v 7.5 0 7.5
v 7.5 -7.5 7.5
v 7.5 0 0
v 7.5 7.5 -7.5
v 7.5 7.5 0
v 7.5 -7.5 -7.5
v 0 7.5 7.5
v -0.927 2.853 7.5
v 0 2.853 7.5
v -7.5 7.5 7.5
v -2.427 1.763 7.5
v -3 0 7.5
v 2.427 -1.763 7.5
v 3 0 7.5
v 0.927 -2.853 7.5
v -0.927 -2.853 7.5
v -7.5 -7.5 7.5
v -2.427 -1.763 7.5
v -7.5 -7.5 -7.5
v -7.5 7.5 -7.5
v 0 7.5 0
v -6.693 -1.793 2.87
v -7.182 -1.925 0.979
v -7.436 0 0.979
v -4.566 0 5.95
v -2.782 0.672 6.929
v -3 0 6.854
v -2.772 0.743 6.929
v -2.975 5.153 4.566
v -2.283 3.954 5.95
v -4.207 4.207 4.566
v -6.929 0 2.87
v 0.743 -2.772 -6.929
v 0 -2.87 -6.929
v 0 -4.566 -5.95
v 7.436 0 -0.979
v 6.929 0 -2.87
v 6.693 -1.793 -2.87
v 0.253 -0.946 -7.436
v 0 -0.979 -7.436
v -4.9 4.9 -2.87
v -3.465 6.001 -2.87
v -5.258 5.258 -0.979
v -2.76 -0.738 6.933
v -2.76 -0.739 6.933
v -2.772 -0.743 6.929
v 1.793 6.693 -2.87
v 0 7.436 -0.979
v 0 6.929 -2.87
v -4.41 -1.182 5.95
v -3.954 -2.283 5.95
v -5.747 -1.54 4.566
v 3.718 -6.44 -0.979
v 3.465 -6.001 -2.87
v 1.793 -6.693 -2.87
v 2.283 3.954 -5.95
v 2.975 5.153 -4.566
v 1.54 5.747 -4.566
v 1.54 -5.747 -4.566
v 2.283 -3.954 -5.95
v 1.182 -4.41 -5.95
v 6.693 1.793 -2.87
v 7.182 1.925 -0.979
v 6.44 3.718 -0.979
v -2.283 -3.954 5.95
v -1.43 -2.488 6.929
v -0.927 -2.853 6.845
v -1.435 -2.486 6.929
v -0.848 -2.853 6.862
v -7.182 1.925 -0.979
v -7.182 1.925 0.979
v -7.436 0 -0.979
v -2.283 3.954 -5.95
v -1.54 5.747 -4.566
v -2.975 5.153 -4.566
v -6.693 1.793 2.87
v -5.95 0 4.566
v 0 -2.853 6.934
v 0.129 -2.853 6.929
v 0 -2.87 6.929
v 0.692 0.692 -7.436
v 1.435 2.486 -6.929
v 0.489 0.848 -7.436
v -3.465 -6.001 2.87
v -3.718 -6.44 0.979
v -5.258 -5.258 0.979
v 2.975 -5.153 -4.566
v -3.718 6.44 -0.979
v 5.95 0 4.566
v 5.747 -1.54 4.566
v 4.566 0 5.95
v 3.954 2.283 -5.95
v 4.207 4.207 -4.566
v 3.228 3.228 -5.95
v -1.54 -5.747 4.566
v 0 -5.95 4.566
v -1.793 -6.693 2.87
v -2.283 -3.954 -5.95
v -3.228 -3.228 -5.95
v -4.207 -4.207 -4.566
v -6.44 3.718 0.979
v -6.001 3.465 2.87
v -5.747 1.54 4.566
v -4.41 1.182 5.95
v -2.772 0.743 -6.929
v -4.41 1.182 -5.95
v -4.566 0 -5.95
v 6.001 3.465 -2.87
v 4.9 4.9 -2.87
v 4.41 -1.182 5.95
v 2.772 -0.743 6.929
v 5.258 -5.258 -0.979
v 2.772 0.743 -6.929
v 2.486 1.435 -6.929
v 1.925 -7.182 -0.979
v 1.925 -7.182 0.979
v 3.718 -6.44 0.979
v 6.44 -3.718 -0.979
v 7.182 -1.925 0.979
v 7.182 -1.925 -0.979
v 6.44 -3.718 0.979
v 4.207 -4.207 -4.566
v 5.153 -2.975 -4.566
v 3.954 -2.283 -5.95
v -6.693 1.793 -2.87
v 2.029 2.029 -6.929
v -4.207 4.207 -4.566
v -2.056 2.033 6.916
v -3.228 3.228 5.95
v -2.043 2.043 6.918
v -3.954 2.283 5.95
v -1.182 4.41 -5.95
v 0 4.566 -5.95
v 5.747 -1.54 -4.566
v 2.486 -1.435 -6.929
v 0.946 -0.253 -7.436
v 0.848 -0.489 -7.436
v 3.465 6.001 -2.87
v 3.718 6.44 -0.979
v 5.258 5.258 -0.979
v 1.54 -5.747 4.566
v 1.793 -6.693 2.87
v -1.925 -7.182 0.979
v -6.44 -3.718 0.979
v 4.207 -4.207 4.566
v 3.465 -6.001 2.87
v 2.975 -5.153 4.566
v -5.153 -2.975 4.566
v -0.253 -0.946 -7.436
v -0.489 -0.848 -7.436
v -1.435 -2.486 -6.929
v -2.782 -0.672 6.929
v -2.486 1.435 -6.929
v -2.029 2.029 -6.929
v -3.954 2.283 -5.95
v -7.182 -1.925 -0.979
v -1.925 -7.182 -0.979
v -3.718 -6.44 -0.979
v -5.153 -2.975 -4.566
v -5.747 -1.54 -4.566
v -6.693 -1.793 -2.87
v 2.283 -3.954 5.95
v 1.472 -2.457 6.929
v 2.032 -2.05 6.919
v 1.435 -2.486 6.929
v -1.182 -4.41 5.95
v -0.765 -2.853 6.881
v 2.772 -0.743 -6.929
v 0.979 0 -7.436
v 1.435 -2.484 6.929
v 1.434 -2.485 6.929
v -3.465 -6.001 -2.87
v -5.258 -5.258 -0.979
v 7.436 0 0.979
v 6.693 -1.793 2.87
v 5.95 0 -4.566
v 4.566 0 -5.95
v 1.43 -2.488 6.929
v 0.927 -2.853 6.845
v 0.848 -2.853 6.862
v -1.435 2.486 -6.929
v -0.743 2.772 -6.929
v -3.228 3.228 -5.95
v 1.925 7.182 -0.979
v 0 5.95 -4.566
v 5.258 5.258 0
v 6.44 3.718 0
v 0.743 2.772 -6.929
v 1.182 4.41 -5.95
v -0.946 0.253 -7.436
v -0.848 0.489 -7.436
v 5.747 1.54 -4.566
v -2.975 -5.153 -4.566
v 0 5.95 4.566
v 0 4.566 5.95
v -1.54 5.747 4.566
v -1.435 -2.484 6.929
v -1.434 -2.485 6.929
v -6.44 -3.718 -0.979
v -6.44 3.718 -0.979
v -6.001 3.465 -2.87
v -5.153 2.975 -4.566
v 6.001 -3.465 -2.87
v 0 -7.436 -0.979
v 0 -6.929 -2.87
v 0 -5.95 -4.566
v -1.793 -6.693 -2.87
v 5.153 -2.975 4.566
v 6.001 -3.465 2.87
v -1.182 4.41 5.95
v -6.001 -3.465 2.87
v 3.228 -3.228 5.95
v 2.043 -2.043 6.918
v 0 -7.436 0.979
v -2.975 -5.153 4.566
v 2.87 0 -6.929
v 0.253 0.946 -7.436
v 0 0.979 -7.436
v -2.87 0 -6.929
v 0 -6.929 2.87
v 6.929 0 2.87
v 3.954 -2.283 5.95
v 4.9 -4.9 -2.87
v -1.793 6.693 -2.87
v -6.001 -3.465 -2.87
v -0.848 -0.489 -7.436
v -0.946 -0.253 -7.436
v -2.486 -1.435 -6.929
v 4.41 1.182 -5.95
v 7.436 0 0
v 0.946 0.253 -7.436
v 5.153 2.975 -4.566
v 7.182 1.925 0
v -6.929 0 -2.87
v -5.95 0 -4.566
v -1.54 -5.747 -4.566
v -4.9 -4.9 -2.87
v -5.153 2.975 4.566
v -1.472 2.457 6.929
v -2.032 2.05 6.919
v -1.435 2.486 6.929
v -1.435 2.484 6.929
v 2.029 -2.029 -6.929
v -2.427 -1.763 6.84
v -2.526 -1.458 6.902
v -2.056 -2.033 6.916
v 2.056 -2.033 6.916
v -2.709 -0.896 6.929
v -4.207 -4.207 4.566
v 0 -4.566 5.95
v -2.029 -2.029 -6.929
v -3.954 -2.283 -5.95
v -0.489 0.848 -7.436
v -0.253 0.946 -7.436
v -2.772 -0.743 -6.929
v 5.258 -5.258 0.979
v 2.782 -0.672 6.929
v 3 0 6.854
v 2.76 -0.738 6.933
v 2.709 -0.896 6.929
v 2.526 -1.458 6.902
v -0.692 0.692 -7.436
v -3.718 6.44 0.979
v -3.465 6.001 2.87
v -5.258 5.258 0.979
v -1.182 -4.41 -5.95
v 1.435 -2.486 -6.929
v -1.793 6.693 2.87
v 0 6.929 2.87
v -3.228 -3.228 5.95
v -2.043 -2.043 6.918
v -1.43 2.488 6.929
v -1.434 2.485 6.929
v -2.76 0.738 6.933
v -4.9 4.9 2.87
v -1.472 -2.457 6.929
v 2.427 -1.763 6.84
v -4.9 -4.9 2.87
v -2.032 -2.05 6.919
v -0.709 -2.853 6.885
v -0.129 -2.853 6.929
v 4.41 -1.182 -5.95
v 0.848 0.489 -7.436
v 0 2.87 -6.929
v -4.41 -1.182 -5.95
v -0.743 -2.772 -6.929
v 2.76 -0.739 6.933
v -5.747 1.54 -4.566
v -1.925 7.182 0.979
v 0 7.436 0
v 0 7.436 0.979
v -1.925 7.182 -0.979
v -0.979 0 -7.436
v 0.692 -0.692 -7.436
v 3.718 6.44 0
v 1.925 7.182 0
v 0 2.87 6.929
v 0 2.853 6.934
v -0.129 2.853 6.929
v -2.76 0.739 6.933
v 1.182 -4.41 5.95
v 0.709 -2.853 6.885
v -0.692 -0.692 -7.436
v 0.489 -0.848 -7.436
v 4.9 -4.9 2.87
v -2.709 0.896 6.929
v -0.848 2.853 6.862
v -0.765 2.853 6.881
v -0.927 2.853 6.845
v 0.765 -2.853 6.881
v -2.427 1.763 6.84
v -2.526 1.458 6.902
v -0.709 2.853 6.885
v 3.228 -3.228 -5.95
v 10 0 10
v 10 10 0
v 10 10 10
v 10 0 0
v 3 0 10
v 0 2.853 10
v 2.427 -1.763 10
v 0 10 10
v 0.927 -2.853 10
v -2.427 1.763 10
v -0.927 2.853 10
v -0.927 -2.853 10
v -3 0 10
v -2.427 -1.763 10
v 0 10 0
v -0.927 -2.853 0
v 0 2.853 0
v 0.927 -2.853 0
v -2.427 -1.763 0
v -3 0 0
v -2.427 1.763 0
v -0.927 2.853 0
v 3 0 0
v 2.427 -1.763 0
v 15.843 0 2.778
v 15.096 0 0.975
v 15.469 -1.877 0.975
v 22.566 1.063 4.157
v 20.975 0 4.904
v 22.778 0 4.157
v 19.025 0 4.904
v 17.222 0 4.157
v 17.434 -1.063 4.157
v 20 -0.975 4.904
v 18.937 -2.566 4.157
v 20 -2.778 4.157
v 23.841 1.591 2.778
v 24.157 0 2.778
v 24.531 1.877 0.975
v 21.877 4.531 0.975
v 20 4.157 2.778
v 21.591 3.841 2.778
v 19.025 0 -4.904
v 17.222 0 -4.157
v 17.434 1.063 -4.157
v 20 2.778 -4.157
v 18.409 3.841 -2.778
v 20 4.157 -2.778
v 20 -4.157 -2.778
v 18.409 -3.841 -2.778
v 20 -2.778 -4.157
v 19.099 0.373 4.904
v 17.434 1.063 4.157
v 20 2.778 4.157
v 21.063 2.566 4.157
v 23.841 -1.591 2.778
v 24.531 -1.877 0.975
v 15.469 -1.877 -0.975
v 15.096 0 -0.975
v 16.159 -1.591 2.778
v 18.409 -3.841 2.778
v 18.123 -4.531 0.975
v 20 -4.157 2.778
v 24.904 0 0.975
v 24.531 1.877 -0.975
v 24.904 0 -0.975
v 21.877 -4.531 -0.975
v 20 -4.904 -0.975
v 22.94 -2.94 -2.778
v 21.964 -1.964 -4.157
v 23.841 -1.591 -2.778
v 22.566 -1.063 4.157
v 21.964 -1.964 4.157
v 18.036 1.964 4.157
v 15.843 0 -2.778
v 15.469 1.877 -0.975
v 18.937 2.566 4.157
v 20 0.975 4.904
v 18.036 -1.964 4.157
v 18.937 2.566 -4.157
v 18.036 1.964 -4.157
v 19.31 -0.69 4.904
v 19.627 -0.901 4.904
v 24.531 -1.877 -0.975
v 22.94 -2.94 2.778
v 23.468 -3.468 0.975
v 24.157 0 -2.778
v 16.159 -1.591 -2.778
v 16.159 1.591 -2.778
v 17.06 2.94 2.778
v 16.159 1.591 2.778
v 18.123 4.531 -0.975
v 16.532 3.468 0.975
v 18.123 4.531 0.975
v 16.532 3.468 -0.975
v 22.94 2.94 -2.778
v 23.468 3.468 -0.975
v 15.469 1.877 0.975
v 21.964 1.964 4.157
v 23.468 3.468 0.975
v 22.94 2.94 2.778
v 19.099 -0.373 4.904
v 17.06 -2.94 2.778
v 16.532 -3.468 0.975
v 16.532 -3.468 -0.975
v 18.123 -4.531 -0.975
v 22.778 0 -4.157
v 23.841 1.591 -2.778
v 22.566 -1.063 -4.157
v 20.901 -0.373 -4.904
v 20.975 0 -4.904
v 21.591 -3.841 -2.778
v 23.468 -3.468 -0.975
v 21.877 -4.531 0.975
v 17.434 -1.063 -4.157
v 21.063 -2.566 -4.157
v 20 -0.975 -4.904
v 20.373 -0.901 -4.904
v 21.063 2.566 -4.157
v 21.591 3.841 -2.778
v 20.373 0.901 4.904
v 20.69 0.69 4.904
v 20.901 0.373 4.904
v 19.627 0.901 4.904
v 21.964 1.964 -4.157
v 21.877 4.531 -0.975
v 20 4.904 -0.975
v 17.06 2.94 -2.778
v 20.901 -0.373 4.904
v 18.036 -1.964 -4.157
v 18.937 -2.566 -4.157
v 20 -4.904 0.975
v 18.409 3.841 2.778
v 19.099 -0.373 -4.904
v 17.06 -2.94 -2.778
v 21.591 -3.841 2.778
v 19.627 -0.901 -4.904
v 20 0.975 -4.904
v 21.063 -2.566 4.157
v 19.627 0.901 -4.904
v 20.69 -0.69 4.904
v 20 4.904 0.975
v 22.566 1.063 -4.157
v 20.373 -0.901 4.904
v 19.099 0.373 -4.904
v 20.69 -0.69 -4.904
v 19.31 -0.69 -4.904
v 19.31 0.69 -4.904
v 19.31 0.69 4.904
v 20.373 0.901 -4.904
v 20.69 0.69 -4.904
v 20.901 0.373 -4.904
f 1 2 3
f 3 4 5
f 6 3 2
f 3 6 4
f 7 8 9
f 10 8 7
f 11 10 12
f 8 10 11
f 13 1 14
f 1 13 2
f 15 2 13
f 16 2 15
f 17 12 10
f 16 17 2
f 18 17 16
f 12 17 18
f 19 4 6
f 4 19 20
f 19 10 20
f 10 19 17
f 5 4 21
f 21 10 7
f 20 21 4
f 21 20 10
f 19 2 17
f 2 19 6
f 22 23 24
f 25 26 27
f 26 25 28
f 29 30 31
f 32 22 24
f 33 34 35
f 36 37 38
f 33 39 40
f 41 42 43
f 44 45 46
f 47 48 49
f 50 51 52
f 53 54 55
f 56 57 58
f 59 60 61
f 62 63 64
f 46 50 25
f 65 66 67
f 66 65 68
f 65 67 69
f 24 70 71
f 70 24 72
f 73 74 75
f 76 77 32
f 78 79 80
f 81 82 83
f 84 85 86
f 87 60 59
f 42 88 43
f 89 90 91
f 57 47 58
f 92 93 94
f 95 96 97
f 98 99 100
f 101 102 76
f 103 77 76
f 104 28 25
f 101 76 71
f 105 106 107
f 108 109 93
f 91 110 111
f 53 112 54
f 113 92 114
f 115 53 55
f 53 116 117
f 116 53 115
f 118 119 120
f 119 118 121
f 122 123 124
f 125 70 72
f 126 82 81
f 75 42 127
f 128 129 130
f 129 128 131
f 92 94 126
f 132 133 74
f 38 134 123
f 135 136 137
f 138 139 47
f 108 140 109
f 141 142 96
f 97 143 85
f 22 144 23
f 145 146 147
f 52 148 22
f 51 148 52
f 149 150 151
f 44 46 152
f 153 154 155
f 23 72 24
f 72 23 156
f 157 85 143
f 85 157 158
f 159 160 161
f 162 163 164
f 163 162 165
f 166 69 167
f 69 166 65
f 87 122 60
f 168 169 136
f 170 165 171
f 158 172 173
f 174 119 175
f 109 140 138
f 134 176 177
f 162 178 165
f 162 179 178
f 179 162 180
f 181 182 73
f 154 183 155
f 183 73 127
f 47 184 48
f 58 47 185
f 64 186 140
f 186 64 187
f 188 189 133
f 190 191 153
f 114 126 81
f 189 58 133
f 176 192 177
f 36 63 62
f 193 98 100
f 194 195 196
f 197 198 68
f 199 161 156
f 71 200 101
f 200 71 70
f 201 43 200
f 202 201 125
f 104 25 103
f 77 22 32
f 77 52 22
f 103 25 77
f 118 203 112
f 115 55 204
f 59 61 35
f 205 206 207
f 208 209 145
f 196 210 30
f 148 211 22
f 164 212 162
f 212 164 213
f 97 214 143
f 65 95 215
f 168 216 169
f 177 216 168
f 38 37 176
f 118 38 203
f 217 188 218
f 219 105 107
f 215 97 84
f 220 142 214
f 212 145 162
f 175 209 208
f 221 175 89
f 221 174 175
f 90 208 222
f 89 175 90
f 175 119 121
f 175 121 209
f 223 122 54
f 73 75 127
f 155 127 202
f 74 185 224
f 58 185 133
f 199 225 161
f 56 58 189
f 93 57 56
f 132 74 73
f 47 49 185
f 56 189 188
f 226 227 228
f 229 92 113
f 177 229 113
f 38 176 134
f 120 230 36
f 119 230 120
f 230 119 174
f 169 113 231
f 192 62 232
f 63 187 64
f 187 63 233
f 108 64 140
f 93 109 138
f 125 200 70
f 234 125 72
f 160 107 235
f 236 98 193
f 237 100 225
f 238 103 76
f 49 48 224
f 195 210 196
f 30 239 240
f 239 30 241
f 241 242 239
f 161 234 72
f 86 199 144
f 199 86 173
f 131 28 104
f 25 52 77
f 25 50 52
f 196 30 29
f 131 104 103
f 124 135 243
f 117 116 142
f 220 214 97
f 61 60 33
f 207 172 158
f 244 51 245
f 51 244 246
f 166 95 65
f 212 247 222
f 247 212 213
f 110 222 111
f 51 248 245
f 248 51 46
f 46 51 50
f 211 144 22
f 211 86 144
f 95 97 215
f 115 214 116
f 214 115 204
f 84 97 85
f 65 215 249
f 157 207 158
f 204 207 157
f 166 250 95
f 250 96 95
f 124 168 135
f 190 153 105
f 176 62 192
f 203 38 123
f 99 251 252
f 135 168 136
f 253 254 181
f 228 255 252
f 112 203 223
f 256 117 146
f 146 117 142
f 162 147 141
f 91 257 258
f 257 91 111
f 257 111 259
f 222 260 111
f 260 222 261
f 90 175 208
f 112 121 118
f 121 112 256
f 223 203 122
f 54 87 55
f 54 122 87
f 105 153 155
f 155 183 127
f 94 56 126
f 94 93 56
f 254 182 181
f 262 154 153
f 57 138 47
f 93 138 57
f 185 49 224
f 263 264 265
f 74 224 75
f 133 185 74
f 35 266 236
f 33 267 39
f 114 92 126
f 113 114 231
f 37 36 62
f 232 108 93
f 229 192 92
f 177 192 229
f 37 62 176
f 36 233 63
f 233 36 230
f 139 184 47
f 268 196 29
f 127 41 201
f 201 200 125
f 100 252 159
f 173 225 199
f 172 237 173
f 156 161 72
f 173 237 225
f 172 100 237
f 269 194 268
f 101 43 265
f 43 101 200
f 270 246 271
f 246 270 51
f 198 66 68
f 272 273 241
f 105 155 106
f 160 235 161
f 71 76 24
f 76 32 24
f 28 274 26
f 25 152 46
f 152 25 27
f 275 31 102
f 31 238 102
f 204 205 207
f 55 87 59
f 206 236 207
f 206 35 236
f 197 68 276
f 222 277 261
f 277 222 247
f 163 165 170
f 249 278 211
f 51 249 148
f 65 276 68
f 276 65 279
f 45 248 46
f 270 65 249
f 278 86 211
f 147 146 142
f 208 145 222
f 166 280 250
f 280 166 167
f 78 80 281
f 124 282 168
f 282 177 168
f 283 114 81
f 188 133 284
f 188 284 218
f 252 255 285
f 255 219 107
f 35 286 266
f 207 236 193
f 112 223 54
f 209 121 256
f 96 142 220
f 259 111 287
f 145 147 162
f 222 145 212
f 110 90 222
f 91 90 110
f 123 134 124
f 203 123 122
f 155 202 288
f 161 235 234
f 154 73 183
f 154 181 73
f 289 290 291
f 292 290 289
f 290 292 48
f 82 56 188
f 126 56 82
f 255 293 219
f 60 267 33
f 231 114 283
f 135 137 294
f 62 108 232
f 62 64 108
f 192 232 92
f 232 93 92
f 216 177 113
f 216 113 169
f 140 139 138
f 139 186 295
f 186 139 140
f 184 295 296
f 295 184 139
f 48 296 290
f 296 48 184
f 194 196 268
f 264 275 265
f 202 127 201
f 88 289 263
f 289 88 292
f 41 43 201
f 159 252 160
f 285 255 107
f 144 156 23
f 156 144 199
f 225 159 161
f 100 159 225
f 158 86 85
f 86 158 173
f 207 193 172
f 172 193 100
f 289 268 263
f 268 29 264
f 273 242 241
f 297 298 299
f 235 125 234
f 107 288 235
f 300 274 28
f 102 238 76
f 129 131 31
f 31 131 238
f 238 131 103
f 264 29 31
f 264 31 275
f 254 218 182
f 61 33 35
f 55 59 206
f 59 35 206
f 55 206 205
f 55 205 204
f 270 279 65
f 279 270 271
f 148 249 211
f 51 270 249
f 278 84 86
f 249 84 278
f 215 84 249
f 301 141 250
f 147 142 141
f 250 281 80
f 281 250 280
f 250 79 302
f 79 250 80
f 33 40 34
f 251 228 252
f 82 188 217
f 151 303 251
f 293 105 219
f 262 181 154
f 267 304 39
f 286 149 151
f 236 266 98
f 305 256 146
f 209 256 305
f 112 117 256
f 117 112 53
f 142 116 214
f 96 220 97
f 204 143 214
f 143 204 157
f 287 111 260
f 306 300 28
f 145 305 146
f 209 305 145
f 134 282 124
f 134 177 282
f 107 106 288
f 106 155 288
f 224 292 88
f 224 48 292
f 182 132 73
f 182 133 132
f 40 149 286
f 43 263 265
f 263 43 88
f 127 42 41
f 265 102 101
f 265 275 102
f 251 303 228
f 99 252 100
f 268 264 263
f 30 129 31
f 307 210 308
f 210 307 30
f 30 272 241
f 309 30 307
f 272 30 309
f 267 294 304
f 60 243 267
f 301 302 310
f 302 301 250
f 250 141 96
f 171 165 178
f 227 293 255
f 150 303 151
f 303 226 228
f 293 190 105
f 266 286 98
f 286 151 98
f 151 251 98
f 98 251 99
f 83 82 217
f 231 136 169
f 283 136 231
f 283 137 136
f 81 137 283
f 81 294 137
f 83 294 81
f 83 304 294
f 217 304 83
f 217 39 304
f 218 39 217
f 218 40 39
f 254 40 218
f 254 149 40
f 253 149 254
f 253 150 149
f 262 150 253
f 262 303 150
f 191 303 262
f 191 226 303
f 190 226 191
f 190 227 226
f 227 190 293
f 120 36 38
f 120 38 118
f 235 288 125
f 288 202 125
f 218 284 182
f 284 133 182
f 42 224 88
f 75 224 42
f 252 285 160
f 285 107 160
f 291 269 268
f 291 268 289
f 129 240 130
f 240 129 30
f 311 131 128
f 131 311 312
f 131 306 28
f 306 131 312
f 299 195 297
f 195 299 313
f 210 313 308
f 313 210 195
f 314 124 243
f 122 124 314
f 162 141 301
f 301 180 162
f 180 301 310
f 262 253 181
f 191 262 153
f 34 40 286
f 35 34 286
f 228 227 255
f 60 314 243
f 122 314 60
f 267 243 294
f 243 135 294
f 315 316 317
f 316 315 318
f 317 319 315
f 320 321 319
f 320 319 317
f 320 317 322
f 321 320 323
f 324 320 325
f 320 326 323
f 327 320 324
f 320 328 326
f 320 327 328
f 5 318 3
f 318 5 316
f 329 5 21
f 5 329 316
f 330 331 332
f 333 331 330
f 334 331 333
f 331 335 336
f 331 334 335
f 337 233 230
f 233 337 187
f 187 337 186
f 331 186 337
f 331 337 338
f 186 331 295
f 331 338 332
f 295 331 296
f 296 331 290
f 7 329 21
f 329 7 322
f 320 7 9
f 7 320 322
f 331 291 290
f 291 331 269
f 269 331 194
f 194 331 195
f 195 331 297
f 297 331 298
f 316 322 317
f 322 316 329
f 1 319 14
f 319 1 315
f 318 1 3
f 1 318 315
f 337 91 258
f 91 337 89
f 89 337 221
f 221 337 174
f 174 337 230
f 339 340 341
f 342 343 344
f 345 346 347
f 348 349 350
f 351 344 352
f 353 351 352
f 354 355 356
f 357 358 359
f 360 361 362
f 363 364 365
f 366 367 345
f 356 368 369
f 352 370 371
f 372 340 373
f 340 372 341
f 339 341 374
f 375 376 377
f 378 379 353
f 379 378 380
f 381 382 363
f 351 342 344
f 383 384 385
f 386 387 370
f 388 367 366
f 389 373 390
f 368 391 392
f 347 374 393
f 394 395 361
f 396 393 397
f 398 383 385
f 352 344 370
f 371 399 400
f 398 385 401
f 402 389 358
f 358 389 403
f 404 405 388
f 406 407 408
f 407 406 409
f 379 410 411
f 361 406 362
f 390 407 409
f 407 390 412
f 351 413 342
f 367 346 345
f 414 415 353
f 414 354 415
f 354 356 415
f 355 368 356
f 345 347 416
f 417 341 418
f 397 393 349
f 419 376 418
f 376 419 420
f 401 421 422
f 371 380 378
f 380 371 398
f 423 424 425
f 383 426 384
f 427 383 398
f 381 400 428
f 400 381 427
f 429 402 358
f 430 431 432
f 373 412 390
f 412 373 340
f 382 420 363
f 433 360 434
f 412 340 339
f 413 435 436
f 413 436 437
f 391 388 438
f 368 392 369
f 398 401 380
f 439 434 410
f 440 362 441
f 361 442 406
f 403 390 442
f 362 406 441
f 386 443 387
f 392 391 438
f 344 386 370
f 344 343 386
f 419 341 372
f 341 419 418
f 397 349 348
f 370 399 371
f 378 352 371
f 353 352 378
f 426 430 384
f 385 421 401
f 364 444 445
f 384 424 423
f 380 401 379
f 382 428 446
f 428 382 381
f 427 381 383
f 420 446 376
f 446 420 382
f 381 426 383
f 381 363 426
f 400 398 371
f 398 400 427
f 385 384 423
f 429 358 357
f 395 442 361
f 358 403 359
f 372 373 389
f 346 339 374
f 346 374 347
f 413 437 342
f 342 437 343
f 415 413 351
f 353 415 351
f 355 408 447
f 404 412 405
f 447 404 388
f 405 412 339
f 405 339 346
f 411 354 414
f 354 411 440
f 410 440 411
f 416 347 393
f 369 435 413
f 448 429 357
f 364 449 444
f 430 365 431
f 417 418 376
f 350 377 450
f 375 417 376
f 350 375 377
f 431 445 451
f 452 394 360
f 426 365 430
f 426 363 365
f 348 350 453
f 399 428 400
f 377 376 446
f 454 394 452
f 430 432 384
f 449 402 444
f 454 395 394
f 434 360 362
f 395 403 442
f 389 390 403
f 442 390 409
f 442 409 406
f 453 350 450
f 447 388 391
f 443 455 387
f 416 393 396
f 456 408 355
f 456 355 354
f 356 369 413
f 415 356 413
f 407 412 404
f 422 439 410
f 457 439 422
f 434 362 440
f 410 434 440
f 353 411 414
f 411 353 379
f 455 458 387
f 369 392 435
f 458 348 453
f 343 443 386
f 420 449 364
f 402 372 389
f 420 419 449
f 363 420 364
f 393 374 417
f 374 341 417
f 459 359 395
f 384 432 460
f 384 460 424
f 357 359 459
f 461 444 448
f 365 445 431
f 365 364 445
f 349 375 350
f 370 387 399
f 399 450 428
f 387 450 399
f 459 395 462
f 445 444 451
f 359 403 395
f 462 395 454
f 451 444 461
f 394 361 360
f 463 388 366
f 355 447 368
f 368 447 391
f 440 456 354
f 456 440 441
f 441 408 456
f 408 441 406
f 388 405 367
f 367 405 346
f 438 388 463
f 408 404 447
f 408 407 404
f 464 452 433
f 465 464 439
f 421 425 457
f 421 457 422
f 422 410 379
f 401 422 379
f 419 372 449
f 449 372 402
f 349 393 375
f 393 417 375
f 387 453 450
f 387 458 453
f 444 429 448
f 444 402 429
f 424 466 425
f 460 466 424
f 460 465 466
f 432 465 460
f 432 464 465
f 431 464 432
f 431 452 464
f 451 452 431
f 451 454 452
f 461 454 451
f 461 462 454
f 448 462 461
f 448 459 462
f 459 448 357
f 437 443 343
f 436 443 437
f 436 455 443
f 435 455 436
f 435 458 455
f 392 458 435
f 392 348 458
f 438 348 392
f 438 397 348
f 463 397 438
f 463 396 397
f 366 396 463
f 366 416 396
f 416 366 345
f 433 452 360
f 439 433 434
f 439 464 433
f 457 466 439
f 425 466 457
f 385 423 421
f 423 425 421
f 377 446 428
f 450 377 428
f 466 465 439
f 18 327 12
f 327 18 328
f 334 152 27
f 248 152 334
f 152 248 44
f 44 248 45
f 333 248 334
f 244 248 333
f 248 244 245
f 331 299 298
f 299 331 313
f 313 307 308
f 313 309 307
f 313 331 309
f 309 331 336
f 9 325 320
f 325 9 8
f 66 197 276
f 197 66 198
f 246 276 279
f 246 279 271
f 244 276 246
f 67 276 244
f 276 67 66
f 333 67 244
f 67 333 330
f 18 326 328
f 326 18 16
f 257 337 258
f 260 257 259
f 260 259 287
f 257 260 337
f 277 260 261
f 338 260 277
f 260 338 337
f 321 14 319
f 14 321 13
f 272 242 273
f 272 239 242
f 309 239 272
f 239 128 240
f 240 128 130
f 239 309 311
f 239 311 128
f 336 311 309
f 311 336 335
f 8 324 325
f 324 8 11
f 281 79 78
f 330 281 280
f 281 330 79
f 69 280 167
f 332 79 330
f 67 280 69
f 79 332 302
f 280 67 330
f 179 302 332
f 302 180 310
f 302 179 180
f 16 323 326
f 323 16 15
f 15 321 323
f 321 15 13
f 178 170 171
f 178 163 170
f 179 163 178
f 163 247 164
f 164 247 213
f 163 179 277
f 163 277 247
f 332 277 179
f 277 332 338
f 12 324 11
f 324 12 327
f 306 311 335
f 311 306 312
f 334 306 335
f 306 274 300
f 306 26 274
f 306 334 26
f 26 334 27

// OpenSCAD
// Test OpenSCAD file for integration tests

// Simple cube
cube(10);

// Translated sphere
translate([20, 0, 0])
    sphere(r = 5);

// Custom module
module my_shape(size = 10) {
    difference() {
        cube(size, center = true);
        sphere(r = size / 2);
    }
}

// Use custom module
my_shape(15);

// Function example
function double(x) = x * 2;

// Variable with function
size = double(5);

// Use variable
cylinder(h = size, r = 3);
